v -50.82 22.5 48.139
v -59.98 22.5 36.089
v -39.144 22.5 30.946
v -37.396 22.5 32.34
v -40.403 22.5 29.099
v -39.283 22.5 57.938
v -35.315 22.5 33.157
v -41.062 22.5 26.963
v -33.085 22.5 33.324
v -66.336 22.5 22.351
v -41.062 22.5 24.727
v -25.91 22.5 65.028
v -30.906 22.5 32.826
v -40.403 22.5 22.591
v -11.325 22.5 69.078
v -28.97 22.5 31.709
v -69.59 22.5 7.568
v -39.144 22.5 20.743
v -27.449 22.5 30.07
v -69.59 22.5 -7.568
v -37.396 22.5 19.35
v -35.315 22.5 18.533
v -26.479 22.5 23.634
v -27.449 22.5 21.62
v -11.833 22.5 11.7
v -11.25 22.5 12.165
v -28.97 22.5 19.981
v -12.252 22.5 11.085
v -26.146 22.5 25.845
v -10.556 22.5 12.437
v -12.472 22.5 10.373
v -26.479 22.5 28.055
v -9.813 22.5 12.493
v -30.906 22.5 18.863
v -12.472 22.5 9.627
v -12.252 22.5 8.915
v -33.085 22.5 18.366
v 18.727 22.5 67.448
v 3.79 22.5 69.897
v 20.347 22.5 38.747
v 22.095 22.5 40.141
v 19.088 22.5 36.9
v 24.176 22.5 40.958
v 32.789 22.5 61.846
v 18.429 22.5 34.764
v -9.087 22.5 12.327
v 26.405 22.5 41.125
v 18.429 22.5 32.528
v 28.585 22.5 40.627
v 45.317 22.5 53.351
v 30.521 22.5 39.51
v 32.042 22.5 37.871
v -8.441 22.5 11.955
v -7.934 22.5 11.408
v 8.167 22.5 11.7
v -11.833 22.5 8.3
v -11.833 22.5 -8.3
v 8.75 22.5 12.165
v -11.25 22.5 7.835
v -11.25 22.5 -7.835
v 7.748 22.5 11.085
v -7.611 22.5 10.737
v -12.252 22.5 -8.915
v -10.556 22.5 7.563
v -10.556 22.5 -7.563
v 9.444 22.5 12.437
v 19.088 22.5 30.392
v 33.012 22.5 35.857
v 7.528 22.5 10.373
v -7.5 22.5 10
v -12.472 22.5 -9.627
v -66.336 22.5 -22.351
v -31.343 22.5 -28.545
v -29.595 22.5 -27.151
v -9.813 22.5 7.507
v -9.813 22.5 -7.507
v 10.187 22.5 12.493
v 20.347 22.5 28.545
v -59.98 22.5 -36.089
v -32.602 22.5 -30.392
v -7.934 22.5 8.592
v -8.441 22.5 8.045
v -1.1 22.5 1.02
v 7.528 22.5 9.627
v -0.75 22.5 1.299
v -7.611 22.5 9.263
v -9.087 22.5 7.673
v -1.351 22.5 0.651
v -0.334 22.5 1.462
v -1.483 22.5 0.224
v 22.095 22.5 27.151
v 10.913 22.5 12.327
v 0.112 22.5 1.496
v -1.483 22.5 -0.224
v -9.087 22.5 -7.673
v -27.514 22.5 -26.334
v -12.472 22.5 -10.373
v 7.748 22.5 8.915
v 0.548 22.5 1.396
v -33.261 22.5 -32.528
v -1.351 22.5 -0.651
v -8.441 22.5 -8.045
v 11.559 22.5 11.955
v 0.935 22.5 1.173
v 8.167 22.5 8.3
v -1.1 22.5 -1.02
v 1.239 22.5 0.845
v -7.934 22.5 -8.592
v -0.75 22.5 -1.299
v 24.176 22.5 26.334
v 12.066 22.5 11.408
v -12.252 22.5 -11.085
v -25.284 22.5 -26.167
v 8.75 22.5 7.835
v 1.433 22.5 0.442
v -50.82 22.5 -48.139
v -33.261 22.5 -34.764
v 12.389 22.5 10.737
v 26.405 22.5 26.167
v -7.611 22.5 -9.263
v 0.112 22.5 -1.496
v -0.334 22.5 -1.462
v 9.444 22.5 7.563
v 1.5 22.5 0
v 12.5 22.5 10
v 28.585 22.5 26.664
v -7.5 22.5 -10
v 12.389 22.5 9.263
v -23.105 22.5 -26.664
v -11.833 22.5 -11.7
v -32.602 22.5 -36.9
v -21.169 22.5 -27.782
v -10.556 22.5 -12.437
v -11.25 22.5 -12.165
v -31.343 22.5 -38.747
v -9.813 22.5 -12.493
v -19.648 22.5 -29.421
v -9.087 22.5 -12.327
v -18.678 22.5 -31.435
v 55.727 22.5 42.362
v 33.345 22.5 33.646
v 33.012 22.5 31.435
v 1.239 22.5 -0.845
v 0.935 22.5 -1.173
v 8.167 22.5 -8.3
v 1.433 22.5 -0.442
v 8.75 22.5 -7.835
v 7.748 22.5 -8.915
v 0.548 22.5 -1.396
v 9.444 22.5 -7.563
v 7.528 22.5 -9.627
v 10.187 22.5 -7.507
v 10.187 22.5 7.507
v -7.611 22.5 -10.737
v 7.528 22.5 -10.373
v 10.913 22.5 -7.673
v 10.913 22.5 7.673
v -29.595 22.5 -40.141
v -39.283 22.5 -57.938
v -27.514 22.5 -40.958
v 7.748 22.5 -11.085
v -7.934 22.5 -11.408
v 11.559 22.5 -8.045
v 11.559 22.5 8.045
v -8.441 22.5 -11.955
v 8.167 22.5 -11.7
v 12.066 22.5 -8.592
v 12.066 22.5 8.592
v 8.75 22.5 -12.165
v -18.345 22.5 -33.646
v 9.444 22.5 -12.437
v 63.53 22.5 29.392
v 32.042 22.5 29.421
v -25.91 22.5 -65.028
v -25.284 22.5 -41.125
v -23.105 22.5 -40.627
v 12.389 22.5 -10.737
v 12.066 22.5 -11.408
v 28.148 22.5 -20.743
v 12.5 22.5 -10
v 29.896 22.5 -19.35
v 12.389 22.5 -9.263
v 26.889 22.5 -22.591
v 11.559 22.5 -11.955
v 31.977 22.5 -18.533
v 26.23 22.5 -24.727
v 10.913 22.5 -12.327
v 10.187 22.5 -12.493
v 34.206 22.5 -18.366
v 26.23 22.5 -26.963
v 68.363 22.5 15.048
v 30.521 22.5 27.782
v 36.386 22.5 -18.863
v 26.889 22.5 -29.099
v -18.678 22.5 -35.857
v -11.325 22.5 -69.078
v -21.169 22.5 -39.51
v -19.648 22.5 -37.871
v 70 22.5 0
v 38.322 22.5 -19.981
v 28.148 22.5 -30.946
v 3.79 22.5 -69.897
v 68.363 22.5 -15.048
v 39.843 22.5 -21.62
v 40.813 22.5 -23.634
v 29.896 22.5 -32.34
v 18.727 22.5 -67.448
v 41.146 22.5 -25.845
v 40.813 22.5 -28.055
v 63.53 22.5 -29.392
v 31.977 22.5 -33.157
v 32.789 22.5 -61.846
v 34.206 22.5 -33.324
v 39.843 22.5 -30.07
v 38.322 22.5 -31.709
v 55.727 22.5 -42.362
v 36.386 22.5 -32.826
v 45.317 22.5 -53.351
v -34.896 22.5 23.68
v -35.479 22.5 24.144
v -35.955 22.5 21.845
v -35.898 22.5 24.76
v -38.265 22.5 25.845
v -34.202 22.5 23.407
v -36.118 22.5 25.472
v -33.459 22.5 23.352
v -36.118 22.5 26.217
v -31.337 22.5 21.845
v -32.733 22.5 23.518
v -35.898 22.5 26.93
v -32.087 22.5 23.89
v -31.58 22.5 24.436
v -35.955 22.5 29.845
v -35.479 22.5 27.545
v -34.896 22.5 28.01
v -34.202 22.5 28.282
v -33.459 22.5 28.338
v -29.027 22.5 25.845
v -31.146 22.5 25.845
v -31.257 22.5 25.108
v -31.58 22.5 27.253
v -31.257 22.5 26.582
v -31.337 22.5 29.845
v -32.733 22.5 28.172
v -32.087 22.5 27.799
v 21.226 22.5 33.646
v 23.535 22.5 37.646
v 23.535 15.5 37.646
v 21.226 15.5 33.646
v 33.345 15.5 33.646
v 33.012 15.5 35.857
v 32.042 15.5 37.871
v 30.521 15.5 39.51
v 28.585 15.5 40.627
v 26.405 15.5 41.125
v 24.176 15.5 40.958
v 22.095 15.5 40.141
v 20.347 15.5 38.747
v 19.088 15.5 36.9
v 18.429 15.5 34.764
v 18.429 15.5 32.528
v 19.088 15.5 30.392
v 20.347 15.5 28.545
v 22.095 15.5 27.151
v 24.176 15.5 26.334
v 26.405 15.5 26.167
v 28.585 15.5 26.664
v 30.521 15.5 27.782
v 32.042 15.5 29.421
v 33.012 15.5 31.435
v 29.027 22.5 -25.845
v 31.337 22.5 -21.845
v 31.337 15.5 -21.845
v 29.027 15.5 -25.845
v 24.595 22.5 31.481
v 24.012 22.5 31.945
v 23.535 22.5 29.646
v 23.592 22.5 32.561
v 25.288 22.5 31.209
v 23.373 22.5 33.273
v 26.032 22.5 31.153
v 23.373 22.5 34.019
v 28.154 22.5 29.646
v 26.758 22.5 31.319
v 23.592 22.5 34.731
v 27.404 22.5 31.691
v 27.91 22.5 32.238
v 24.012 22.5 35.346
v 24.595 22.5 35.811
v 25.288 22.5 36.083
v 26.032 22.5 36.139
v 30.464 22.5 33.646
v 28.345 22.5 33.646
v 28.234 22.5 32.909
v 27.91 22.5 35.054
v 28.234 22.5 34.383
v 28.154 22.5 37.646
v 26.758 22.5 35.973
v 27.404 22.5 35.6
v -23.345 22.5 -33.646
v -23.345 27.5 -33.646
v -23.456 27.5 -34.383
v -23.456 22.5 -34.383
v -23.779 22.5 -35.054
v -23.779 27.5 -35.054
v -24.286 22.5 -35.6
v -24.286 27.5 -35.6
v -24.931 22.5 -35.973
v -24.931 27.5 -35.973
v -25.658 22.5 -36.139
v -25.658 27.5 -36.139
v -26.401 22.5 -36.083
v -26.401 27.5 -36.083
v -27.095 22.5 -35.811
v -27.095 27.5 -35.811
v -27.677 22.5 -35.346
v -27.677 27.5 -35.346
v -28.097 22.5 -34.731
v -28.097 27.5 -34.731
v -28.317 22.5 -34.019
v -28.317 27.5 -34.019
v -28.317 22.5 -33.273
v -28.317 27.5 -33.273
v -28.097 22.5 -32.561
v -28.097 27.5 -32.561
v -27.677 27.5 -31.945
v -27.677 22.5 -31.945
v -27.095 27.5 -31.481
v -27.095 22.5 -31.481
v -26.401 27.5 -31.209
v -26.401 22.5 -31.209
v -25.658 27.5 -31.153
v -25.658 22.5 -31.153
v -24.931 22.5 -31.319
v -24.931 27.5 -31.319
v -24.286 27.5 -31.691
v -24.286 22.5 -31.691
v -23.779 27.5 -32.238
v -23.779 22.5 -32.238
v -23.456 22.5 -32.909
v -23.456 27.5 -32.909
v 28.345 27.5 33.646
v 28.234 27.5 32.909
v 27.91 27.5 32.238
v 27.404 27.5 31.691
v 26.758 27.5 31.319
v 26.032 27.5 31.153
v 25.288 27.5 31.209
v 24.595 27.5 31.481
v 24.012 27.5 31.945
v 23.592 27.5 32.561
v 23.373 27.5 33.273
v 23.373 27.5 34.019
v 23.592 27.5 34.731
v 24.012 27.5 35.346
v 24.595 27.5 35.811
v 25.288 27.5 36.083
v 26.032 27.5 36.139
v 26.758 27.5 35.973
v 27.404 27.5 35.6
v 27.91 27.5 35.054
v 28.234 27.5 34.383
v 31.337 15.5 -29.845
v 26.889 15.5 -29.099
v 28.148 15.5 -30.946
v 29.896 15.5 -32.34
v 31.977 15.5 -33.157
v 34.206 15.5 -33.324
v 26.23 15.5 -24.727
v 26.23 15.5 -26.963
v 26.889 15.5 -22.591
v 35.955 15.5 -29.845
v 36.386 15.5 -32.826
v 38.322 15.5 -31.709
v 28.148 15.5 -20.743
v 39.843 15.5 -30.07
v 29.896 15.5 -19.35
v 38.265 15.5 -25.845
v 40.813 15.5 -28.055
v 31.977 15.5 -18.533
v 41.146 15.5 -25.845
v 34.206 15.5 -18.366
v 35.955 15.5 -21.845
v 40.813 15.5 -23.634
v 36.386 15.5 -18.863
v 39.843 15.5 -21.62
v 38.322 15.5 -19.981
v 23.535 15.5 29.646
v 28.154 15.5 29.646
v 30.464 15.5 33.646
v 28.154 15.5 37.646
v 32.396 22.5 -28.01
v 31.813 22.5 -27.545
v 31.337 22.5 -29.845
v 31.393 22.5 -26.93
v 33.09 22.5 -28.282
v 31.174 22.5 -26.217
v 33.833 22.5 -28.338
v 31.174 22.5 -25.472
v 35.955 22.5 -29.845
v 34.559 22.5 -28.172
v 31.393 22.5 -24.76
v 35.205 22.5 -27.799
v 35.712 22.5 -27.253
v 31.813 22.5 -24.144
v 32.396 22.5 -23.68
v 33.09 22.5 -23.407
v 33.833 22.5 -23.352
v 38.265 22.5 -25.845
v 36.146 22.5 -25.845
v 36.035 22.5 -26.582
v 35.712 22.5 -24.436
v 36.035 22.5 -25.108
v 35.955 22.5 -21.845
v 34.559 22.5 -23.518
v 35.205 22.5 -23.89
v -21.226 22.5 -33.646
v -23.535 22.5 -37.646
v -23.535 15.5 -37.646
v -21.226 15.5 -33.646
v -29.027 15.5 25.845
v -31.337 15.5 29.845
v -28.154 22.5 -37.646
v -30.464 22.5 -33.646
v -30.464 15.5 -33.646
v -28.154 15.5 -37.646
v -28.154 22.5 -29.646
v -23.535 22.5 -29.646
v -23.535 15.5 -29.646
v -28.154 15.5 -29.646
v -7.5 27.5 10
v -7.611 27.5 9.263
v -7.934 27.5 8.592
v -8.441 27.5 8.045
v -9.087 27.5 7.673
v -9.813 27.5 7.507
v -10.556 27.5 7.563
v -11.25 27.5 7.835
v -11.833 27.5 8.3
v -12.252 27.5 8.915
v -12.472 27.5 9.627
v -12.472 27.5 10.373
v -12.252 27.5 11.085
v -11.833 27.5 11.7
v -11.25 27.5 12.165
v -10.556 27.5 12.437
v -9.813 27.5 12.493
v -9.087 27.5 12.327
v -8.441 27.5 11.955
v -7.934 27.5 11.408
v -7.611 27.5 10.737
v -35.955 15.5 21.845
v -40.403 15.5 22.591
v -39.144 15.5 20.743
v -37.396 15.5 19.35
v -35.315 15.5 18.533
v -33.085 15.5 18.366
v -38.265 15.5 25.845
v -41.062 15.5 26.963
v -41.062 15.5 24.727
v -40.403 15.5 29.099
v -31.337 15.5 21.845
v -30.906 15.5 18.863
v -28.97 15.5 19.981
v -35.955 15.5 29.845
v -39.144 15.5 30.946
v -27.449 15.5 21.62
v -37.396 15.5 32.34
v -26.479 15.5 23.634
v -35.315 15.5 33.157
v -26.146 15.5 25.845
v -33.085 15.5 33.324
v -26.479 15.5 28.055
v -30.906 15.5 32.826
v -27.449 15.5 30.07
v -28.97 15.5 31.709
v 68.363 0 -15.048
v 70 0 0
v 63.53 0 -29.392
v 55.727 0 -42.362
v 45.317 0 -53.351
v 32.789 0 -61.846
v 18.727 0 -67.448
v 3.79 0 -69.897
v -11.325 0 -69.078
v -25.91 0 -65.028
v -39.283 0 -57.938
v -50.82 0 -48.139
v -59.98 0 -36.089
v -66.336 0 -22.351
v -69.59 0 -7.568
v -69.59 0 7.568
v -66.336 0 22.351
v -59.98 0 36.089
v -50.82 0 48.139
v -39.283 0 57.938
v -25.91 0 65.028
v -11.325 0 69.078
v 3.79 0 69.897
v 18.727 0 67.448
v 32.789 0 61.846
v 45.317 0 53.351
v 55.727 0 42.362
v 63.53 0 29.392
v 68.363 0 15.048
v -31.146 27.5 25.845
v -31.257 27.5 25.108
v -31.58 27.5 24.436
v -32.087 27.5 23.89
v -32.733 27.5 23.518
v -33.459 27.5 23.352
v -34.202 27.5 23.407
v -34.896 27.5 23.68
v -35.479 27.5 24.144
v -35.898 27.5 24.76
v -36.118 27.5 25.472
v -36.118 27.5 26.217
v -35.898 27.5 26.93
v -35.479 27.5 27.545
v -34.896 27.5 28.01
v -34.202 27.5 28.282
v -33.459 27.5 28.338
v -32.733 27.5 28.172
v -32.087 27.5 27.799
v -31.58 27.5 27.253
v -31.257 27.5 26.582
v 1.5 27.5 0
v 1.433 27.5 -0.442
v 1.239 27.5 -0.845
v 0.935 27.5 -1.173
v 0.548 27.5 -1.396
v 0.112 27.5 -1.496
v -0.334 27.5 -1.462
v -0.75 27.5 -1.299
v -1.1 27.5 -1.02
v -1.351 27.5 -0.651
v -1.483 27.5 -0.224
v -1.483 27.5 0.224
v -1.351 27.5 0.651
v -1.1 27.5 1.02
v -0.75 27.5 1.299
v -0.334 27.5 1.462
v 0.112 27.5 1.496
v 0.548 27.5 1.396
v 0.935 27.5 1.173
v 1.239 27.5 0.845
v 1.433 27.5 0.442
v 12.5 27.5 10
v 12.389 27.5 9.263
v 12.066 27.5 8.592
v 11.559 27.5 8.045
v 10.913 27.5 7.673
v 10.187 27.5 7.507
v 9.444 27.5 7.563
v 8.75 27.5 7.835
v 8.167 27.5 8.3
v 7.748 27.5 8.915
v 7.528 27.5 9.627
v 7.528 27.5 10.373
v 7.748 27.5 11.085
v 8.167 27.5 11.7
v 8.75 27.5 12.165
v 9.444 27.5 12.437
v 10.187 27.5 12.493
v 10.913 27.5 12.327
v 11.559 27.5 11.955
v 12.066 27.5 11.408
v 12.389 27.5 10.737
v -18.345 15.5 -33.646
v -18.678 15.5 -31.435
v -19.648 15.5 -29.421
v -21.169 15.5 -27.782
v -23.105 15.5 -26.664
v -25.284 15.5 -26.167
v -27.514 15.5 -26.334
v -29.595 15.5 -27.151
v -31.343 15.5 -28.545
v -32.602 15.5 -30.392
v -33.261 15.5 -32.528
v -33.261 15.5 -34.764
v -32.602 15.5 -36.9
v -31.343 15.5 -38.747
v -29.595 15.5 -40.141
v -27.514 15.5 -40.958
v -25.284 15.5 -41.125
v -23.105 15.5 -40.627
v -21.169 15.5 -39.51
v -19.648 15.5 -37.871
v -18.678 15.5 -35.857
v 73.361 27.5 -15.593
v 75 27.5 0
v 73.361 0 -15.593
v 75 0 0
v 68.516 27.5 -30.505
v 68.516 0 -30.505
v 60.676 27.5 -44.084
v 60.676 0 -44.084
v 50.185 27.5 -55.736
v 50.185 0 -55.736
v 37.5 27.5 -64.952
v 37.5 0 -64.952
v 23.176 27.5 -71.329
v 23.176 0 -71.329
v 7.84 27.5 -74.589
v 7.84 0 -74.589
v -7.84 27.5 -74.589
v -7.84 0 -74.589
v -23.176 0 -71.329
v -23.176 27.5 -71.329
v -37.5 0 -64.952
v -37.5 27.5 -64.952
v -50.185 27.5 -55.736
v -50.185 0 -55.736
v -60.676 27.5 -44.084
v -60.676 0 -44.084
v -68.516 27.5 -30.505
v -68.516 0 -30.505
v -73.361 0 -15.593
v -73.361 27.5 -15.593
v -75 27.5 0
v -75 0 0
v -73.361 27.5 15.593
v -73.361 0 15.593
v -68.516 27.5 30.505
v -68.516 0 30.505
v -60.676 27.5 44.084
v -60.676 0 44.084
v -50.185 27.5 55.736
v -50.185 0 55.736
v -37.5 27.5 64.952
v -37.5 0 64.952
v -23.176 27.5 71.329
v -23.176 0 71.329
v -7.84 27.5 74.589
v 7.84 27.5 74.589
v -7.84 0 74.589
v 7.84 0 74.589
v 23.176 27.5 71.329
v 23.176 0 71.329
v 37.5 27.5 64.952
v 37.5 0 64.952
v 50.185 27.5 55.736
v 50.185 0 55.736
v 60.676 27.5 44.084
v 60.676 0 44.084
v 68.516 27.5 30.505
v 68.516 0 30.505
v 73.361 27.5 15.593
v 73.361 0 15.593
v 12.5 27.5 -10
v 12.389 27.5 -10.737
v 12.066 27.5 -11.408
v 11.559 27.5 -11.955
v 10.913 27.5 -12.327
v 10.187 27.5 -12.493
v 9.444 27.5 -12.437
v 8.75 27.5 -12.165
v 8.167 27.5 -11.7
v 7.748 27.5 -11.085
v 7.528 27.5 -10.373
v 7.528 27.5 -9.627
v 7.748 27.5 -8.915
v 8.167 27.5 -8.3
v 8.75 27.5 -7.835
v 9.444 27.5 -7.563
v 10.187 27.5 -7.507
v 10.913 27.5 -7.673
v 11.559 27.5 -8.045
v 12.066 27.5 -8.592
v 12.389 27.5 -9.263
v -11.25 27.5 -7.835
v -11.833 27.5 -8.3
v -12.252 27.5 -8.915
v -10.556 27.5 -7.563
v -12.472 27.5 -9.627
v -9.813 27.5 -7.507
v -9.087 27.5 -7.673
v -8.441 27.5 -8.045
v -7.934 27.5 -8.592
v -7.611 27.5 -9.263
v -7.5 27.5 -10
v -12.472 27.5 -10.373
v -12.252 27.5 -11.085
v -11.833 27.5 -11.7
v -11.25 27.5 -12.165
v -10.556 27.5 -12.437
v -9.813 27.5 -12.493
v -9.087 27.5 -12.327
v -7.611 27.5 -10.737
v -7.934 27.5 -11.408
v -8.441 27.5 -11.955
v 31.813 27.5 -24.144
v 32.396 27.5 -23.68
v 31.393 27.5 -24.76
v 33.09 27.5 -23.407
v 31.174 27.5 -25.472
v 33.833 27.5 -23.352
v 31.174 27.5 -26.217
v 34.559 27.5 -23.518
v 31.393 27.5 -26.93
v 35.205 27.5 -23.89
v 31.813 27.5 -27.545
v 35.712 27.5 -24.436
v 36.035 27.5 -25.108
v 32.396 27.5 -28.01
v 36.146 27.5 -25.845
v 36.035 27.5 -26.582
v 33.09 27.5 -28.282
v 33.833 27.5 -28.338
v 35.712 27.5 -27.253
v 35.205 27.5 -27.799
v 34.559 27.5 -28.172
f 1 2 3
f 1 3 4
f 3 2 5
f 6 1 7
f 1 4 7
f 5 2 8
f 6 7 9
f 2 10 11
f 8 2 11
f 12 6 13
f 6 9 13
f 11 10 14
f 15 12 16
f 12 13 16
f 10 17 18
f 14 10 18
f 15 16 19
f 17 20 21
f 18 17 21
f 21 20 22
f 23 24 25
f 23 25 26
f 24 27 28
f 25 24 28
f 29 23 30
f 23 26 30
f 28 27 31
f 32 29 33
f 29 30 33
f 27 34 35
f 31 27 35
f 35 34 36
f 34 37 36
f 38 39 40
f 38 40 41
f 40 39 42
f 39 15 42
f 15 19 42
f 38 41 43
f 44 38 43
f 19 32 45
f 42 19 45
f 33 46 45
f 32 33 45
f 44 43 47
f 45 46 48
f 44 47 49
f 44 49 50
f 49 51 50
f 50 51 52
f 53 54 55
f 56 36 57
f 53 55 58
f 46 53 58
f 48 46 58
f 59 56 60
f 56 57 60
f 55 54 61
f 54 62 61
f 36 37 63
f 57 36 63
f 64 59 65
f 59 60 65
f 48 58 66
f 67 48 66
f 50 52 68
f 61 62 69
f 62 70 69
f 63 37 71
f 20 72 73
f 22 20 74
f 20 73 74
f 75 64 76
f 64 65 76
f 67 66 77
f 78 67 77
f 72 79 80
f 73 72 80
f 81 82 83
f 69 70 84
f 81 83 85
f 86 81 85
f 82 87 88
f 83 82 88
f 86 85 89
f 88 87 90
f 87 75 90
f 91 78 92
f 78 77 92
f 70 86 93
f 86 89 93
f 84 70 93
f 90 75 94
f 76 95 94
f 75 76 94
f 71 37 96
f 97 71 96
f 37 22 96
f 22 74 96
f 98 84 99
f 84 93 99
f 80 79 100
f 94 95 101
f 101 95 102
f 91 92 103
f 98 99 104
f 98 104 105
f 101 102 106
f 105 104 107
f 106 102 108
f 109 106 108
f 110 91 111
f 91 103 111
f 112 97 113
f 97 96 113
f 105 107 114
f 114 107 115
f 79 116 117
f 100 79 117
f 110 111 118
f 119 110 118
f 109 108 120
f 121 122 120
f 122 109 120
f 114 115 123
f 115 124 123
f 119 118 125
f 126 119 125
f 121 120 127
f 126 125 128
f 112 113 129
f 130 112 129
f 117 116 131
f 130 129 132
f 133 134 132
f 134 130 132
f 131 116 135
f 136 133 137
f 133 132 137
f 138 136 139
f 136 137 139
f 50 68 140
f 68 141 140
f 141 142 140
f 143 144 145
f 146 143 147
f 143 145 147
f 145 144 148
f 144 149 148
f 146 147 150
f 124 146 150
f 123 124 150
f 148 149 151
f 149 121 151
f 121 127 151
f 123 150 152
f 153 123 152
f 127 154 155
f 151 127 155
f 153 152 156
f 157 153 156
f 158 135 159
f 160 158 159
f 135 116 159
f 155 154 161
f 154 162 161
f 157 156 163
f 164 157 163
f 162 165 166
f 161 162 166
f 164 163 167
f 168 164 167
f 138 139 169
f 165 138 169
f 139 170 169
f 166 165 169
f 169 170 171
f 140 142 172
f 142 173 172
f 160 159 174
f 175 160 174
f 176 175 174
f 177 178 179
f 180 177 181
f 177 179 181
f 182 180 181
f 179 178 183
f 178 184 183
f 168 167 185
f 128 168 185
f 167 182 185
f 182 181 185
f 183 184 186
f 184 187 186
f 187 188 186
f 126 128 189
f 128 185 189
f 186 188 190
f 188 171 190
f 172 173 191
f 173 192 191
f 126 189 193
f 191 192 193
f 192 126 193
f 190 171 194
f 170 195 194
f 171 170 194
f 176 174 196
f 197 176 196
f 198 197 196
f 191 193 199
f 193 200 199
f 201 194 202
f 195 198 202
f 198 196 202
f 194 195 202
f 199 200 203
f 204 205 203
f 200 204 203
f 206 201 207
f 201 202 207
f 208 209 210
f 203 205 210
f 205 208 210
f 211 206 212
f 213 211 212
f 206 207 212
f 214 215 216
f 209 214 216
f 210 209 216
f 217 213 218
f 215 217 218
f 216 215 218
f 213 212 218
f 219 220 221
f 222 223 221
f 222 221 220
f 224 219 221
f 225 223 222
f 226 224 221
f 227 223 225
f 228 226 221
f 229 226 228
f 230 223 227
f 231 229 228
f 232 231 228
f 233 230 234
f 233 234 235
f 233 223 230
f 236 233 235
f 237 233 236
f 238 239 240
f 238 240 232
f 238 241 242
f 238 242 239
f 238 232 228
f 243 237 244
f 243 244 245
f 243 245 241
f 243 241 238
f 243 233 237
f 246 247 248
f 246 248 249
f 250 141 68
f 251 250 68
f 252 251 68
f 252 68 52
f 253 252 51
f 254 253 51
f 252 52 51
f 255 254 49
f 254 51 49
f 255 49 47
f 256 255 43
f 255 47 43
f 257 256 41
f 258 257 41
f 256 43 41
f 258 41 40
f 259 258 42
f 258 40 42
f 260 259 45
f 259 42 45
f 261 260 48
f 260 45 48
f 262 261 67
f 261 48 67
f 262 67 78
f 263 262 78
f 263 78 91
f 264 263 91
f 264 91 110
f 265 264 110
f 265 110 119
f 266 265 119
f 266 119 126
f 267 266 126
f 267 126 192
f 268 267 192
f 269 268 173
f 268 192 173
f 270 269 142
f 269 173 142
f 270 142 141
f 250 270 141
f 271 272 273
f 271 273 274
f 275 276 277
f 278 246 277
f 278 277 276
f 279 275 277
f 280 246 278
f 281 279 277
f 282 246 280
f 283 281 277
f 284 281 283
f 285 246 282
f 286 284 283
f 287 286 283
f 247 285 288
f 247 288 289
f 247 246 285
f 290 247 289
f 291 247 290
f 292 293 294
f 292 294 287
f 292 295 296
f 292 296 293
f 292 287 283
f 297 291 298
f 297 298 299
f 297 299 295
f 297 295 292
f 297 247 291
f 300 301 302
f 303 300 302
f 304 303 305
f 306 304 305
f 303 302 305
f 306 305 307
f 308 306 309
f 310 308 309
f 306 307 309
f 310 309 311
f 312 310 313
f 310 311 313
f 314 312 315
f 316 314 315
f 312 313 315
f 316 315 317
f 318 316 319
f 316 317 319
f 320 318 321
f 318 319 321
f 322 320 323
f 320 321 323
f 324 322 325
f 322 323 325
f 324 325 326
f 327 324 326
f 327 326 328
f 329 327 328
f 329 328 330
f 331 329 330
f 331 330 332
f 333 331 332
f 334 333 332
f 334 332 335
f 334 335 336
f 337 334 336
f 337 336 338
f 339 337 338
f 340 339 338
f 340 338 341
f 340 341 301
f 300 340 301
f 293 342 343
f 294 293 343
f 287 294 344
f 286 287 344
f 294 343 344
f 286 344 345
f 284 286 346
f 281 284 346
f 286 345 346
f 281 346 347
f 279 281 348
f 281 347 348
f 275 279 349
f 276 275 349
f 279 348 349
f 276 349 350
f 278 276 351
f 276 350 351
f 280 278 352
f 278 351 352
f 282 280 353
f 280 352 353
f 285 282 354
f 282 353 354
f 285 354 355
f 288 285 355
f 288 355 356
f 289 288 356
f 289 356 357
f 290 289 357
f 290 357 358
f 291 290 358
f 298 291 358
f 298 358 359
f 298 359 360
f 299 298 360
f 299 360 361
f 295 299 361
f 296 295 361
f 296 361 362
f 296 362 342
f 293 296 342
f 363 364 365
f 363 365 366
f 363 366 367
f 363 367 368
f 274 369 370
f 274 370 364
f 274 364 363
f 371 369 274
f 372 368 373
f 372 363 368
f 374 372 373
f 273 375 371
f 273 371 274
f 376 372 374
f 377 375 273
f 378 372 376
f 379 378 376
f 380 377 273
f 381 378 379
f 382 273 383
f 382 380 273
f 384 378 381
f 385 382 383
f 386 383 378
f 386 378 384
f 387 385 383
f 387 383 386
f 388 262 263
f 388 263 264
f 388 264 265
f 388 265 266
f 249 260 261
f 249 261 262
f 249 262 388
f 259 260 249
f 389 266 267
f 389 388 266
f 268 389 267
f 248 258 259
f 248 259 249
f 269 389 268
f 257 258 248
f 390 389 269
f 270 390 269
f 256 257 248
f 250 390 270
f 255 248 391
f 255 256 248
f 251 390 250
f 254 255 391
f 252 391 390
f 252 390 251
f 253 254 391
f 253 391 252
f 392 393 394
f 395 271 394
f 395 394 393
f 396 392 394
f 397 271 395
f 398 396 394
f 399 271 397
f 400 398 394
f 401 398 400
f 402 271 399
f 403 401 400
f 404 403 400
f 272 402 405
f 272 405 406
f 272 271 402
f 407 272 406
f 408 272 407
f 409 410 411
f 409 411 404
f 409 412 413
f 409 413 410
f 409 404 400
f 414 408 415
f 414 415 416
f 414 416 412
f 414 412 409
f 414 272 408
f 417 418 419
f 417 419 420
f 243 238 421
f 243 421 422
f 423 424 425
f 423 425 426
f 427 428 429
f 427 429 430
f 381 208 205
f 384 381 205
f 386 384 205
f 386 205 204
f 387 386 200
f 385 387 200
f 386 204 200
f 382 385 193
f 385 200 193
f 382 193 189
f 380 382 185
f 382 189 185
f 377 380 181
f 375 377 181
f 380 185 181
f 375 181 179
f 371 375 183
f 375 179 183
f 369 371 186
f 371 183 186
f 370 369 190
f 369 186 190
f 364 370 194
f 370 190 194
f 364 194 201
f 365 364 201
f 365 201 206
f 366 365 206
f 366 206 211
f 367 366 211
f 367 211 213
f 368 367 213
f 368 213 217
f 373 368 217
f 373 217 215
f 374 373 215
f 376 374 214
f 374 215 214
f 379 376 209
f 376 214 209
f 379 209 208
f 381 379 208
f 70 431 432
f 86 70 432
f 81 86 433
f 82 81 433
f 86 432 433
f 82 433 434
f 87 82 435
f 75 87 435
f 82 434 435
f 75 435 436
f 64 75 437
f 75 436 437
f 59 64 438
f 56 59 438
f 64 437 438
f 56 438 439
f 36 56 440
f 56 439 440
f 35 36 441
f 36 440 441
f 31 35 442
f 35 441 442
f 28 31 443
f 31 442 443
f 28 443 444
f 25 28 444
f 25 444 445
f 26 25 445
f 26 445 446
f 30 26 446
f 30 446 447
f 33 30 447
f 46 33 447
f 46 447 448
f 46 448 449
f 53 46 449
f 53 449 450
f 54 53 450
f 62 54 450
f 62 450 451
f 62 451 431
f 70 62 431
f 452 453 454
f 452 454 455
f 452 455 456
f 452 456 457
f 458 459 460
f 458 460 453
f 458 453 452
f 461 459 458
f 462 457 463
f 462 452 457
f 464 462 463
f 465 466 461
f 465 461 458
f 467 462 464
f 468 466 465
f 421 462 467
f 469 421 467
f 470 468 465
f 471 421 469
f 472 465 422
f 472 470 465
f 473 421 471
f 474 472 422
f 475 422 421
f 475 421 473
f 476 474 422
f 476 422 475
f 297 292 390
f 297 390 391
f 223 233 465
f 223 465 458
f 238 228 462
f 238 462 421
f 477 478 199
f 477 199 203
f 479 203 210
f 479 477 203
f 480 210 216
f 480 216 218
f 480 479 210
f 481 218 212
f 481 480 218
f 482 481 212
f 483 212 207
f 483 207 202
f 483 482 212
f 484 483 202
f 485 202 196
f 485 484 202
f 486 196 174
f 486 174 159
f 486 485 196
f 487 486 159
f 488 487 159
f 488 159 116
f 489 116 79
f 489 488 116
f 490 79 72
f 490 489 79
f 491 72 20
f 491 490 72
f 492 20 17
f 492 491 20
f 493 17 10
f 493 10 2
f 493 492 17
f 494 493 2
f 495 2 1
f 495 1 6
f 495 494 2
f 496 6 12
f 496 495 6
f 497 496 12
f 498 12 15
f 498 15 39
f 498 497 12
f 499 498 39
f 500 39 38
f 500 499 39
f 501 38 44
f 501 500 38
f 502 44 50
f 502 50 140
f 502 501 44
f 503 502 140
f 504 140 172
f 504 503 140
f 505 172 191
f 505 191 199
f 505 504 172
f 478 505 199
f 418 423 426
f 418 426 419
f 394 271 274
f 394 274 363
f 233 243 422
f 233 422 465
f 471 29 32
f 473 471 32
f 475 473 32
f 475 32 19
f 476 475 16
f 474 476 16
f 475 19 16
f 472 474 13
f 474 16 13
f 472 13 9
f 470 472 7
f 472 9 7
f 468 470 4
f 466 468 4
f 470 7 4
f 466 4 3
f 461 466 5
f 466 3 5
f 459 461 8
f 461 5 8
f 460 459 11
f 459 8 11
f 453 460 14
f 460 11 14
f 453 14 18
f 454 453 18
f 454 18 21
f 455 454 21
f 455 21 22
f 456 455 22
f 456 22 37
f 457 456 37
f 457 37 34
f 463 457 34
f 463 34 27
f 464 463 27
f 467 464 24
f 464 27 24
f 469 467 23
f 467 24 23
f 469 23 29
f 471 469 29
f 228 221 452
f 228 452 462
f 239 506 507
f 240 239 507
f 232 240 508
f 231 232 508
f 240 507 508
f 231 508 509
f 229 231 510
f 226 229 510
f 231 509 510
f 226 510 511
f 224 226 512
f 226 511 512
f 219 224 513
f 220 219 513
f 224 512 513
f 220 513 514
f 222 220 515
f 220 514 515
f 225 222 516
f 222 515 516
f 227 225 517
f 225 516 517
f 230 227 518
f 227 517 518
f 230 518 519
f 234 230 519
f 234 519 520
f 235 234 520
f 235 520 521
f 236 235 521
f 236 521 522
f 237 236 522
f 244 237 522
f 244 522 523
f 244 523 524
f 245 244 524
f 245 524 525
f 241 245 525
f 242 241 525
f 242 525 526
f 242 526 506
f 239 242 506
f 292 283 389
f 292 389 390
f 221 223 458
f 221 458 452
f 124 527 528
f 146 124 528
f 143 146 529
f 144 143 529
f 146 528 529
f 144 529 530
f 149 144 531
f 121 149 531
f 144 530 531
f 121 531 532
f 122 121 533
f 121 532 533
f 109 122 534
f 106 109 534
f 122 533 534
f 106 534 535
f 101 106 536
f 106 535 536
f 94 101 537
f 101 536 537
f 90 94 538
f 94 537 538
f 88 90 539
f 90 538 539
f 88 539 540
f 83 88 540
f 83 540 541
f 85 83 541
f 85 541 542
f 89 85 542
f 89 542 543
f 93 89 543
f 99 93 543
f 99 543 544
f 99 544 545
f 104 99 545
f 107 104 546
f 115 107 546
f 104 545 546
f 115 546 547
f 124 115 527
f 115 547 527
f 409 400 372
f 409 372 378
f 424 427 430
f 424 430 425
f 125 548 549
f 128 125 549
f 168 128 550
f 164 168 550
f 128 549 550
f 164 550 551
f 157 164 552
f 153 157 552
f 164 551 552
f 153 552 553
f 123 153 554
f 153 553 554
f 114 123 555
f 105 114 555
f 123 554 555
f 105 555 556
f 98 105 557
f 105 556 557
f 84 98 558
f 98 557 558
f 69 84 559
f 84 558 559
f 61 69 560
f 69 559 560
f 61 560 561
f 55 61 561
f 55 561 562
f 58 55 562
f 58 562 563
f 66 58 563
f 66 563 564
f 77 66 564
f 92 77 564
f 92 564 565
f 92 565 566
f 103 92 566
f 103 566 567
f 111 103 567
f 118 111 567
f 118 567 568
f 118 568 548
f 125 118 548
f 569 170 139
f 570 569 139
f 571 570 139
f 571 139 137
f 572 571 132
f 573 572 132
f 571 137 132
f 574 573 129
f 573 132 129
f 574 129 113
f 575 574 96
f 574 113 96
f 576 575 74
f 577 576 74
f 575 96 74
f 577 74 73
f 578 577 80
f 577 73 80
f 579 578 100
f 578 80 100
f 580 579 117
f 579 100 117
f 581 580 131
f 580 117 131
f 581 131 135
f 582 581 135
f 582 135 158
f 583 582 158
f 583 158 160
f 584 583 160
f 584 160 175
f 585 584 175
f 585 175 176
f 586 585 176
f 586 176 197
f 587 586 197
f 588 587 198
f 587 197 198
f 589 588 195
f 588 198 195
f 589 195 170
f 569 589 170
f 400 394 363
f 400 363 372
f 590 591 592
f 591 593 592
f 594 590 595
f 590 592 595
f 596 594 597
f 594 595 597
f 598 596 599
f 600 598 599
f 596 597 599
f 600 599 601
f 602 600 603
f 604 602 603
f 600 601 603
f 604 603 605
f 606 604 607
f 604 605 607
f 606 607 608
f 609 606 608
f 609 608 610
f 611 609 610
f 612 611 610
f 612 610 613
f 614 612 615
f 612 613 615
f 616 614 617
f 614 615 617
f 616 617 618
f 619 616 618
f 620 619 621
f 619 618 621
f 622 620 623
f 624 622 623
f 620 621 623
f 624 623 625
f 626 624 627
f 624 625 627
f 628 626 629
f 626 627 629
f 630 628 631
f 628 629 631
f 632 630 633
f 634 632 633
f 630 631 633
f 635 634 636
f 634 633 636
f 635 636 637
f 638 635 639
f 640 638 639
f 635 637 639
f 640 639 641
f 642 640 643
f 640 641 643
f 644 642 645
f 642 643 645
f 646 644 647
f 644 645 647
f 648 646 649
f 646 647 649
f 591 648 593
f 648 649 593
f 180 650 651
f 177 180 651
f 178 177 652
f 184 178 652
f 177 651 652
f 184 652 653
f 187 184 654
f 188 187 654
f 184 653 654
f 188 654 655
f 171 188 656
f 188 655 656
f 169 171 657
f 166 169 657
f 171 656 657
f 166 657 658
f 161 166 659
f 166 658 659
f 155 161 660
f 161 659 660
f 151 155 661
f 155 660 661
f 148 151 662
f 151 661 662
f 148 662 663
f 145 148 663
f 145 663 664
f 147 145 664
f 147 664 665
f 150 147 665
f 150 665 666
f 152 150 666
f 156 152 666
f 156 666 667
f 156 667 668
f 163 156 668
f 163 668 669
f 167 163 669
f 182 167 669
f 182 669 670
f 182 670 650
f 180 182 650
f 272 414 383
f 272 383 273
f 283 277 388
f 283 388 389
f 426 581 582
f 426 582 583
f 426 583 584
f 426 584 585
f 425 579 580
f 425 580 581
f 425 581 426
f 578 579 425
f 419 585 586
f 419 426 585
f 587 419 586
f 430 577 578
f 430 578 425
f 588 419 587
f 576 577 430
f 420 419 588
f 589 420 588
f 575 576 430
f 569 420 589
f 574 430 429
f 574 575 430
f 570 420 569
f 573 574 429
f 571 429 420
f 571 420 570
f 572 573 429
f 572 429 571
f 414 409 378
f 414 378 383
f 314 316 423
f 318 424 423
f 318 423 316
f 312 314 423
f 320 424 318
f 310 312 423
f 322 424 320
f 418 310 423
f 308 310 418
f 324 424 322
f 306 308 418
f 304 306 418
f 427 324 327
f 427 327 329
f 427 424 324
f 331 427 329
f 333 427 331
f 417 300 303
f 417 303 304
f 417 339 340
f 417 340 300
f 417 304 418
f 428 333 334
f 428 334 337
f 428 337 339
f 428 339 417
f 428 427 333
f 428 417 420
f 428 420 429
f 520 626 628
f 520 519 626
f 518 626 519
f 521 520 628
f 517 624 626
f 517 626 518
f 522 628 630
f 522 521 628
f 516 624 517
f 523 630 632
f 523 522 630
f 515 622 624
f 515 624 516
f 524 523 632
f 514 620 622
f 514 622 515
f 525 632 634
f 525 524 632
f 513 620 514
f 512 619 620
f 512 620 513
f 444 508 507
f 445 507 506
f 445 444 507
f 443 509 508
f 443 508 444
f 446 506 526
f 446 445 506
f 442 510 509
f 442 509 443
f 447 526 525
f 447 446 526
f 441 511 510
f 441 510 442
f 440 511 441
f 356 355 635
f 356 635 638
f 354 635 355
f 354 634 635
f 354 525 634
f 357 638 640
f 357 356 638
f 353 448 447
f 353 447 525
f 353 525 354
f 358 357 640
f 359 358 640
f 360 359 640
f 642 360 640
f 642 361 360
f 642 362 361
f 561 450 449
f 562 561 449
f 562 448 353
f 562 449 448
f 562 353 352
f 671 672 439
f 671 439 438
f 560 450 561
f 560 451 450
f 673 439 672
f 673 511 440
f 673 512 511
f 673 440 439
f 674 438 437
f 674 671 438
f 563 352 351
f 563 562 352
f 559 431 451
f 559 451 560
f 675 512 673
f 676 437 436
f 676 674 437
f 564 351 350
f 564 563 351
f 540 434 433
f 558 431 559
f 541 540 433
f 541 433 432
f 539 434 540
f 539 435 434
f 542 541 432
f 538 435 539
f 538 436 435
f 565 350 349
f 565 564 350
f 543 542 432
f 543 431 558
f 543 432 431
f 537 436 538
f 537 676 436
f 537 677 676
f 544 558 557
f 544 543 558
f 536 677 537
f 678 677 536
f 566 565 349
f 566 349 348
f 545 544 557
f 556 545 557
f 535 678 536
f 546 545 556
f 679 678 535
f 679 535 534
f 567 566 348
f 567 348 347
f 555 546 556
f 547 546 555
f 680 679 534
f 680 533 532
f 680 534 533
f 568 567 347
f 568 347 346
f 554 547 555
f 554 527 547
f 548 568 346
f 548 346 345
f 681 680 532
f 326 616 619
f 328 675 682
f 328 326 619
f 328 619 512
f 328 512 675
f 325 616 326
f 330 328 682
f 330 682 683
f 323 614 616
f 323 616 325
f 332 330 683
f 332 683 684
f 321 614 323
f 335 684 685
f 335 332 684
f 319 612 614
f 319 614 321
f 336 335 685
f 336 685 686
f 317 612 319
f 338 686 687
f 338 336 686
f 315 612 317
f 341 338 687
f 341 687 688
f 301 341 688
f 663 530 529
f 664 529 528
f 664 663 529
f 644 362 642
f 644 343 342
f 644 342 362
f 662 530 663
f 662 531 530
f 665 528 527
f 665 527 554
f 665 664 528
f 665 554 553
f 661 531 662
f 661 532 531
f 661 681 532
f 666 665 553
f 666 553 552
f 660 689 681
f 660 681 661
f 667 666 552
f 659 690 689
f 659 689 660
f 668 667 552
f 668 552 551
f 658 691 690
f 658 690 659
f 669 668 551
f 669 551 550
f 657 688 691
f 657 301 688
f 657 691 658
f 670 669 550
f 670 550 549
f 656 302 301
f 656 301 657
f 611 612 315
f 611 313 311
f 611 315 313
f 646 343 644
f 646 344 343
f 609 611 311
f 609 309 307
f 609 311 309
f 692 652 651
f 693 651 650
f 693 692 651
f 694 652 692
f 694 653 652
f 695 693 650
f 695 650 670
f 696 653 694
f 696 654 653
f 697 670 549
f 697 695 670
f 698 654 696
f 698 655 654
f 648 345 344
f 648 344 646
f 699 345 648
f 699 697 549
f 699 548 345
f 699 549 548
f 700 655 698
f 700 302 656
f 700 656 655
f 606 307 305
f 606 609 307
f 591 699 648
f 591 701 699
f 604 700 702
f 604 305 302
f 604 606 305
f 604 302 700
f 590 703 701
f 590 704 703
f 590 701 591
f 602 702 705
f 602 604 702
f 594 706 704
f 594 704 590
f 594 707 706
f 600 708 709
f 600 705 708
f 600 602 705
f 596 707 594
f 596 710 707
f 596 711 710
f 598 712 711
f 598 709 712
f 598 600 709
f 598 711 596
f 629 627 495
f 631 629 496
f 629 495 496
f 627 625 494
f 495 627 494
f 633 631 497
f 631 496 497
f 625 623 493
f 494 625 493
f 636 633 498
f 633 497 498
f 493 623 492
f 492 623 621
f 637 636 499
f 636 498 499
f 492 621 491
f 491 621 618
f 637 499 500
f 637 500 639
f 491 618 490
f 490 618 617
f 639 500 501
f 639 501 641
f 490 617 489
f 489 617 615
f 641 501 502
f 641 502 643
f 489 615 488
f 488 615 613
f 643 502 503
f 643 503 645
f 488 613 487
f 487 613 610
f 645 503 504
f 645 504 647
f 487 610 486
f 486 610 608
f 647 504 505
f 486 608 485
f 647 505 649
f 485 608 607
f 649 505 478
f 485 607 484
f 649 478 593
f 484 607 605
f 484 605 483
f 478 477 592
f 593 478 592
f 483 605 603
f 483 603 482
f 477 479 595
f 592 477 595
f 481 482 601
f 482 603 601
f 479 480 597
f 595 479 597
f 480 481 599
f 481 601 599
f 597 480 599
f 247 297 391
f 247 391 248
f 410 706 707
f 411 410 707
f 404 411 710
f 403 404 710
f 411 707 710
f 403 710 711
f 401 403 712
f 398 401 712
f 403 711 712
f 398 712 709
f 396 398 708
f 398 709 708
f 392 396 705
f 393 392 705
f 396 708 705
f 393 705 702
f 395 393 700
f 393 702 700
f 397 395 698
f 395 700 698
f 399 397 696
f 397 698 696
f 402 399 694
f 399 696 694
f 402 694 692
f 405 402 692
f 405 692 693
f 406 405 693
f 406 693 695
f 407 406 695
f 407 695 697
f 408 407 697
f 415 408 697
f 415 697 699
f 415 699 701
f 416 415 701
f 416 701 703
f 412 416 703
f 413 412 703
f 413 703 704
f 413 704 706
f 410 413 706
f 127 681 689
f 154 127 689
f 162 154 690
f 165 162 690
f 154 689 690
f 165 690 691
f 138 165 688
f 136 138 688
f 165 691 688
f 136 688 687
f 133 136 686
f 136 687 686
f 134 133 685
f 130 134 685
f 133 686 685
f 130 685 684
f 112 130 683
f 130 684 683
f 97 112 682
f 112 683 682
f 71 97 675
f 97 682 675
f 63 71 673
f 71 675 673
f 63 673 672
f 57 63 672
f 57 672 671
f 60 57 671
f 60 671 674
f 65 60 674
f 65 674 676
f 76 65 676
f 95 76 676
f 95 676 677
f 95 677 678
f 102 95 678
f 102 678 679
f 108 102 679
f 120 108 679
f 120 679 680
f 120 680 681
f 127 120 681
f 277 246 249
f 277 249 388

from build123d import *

# Parameters (mm, degrees)
SKETCH1_R            = 75
SKETCH1_R_2          = 70
BOSS_EXTRUDE1_DEPTH  = 22.5
SKETCH2_R            = 75
BOSS_EXTRUDE2_DEPTH  = 5
SKETCH4_R            = 1.5
CUT_EXTRUDE2_DEPTH   = 5
SKETCH5_R            = 2.5
CUT_EXTRUDE3_DEPTH   = 10
LPATTERN1_COUNT      = 2
LPATTERN1_PITCH      = 20
LPATTERN1_COUNT_DIR2 = 2
LPATTERN1_PITCH_DIR2 = 20
SKETCH6_R            = 2.5
CUT_EXTRUDE4_DEPTH   = 10
SKETCH8_R            = 7.5
BOSS_EXTRUDE3_DEPTH  = 7
CUT_EXTRUDE5_DEPTH   = 7


with BuildPart() as part:
    # Sketch1 → Boss-Extrude1 (new body)
    with BuildSketch(Plane(origin=(0, 0, 0), x_dir=(1, 0, 0), z_dir=(0, 1, 0))):
        Circle(SKETCH1_R)
        Circle(SKETCH1_R_2, mode=Mode.SUBTRACT)
    extrude(amount=BOSS_EXTRUDE1_DEPTH)

    # Sketch2 → Boss-Extrude2 (add)
    with BuildSketch(Plane(origin=(0, 22.5, 0), x_dir=(1, 0, 0), z_dir=(0, 1, 0))):
        Circle(SKETCH2_R)
    extrude(amount=BOSS_EXTRUDE2_DEPTH)

    # Sketch4 → Cut-Extrude2 (cut)
    with BuildSketch(Plane(origin=(0, 27.5, 0), x_dir=(1, 0, 0), z_dir=(0, 1, 0))):
        Circle(SKETCH4_R)
    extrude(amount=-CUT_EXTRUDE2_DEPTH, mode=Mode.SUBTRACT)

    # Sketch5 → Cut-Extrude3 (cut)
    with BuildSketch(Plane(origin=(0, 27.5, 0), x_dir=(1, 0, 0), z_dir=(0, 1, 0))):
        with Locations((-10, 10)):
            Circle(SKETCH5_R)
    cut_extrude3 = extrude(amount=-CUT_EXTRUDE3_DEPTH, mode=Mode.SUBTRACT)

    # LPattern1: Cut-Extrude3 2 × 2
    with Locations(*[(j * LPATTERN1_PITCH_DIR2, 0, i * LPATTERN1_PITCH) for i in range(LPATTERN1_COUNT) for j in range(LPATTERN1_COUNT_DIR2) if (i, j) != (0, 0)]):
        add(cut_extrude3, mode=Mode.SUBTRACT)

    # Sketch6 → Cut-Extrude4 (cut)
    with BuildSketch(Plane(origin=(0, 27.5, 0), x_dir=(1, 0, 0), z_dir=(0, 1, 0))):
        with Locations((-25.844790679, 33.64590309)):
            Circle(SKETCH6_R)
        with Locations((33.64590309, 25.844790679)):
            Circle(SKETCH6_R)
        with Locations((-33.64590309, -25.844790679)):
            Circle(SKETCH6_R)
        with Locations((25.844790679, -33.64590309)):
            Circle(SKETCH6_R)
    extrude(amount=-CUT_EXTRUDE4_DEPTH, mode=Mode.SUBTRACT)

    # Sketch8 → Boss-Extrude3 (add)
    with BuildSketch(Plane.XZ.offset(-22.5)):
        with Locations((-33.64590309, 25.844790679)):
            Circle(SKETCH8_R)
        with Locations((25.844790679, 33.64590309)):
            Circle(SKETCH8_R)
        with Locations((33.64590309, -25.844790679)):
            Circle(SKETCH8_R)
        with Locations((-25.844790679, -33.64590309)):
            Circle(SKETCH8_R)
    extrude(amount=BOSS_EXTRUDE3_DEPTH)

    # Sketch7 → Cut-Extrude5 (cut)
    with BuildSketch(Plane.XZ.offset(-22.5)):
        Polygon((-31.336502014, 29.844790679), (-35.955304167, 29.844790679), (-38.264705244, 25.844790679), (-35.955304167, 21.844790679), (-31.336502014, 21.844790679), (-29.027100937, 25.844790679), align=None)
        Polygon((28.154191756, 37.64590309), (23.535389602, 37.64590309), (21.225988525, 33.64590309), (23.535389602, 29.64590309), (28.154191756, 29.64590309), (30.463592832, 33.64590309), align=None)
        Polygon((35.955304167, -21.844790679), (31.336502014, -21.844790679), (29.027100937, -25.844790679), (31.336502014, -29.844790679), (35.955304167, -29.844790679), (38.264705244, -25.844790679), align=None)
        Polygon((-23.535389602, -29.64590309), (-28.154191756, -29.64590309), (-30.463592832, -33.64590309), (-28.154191756, -37.64590309), (-23.535389602, -37.64590309), (-21.225988525, -33.64590309), align=None)
    extrude(amount=CUT_EXTRUDE5_DEPTH, mode=Mode.SUBTRACT)


solid = part.part
